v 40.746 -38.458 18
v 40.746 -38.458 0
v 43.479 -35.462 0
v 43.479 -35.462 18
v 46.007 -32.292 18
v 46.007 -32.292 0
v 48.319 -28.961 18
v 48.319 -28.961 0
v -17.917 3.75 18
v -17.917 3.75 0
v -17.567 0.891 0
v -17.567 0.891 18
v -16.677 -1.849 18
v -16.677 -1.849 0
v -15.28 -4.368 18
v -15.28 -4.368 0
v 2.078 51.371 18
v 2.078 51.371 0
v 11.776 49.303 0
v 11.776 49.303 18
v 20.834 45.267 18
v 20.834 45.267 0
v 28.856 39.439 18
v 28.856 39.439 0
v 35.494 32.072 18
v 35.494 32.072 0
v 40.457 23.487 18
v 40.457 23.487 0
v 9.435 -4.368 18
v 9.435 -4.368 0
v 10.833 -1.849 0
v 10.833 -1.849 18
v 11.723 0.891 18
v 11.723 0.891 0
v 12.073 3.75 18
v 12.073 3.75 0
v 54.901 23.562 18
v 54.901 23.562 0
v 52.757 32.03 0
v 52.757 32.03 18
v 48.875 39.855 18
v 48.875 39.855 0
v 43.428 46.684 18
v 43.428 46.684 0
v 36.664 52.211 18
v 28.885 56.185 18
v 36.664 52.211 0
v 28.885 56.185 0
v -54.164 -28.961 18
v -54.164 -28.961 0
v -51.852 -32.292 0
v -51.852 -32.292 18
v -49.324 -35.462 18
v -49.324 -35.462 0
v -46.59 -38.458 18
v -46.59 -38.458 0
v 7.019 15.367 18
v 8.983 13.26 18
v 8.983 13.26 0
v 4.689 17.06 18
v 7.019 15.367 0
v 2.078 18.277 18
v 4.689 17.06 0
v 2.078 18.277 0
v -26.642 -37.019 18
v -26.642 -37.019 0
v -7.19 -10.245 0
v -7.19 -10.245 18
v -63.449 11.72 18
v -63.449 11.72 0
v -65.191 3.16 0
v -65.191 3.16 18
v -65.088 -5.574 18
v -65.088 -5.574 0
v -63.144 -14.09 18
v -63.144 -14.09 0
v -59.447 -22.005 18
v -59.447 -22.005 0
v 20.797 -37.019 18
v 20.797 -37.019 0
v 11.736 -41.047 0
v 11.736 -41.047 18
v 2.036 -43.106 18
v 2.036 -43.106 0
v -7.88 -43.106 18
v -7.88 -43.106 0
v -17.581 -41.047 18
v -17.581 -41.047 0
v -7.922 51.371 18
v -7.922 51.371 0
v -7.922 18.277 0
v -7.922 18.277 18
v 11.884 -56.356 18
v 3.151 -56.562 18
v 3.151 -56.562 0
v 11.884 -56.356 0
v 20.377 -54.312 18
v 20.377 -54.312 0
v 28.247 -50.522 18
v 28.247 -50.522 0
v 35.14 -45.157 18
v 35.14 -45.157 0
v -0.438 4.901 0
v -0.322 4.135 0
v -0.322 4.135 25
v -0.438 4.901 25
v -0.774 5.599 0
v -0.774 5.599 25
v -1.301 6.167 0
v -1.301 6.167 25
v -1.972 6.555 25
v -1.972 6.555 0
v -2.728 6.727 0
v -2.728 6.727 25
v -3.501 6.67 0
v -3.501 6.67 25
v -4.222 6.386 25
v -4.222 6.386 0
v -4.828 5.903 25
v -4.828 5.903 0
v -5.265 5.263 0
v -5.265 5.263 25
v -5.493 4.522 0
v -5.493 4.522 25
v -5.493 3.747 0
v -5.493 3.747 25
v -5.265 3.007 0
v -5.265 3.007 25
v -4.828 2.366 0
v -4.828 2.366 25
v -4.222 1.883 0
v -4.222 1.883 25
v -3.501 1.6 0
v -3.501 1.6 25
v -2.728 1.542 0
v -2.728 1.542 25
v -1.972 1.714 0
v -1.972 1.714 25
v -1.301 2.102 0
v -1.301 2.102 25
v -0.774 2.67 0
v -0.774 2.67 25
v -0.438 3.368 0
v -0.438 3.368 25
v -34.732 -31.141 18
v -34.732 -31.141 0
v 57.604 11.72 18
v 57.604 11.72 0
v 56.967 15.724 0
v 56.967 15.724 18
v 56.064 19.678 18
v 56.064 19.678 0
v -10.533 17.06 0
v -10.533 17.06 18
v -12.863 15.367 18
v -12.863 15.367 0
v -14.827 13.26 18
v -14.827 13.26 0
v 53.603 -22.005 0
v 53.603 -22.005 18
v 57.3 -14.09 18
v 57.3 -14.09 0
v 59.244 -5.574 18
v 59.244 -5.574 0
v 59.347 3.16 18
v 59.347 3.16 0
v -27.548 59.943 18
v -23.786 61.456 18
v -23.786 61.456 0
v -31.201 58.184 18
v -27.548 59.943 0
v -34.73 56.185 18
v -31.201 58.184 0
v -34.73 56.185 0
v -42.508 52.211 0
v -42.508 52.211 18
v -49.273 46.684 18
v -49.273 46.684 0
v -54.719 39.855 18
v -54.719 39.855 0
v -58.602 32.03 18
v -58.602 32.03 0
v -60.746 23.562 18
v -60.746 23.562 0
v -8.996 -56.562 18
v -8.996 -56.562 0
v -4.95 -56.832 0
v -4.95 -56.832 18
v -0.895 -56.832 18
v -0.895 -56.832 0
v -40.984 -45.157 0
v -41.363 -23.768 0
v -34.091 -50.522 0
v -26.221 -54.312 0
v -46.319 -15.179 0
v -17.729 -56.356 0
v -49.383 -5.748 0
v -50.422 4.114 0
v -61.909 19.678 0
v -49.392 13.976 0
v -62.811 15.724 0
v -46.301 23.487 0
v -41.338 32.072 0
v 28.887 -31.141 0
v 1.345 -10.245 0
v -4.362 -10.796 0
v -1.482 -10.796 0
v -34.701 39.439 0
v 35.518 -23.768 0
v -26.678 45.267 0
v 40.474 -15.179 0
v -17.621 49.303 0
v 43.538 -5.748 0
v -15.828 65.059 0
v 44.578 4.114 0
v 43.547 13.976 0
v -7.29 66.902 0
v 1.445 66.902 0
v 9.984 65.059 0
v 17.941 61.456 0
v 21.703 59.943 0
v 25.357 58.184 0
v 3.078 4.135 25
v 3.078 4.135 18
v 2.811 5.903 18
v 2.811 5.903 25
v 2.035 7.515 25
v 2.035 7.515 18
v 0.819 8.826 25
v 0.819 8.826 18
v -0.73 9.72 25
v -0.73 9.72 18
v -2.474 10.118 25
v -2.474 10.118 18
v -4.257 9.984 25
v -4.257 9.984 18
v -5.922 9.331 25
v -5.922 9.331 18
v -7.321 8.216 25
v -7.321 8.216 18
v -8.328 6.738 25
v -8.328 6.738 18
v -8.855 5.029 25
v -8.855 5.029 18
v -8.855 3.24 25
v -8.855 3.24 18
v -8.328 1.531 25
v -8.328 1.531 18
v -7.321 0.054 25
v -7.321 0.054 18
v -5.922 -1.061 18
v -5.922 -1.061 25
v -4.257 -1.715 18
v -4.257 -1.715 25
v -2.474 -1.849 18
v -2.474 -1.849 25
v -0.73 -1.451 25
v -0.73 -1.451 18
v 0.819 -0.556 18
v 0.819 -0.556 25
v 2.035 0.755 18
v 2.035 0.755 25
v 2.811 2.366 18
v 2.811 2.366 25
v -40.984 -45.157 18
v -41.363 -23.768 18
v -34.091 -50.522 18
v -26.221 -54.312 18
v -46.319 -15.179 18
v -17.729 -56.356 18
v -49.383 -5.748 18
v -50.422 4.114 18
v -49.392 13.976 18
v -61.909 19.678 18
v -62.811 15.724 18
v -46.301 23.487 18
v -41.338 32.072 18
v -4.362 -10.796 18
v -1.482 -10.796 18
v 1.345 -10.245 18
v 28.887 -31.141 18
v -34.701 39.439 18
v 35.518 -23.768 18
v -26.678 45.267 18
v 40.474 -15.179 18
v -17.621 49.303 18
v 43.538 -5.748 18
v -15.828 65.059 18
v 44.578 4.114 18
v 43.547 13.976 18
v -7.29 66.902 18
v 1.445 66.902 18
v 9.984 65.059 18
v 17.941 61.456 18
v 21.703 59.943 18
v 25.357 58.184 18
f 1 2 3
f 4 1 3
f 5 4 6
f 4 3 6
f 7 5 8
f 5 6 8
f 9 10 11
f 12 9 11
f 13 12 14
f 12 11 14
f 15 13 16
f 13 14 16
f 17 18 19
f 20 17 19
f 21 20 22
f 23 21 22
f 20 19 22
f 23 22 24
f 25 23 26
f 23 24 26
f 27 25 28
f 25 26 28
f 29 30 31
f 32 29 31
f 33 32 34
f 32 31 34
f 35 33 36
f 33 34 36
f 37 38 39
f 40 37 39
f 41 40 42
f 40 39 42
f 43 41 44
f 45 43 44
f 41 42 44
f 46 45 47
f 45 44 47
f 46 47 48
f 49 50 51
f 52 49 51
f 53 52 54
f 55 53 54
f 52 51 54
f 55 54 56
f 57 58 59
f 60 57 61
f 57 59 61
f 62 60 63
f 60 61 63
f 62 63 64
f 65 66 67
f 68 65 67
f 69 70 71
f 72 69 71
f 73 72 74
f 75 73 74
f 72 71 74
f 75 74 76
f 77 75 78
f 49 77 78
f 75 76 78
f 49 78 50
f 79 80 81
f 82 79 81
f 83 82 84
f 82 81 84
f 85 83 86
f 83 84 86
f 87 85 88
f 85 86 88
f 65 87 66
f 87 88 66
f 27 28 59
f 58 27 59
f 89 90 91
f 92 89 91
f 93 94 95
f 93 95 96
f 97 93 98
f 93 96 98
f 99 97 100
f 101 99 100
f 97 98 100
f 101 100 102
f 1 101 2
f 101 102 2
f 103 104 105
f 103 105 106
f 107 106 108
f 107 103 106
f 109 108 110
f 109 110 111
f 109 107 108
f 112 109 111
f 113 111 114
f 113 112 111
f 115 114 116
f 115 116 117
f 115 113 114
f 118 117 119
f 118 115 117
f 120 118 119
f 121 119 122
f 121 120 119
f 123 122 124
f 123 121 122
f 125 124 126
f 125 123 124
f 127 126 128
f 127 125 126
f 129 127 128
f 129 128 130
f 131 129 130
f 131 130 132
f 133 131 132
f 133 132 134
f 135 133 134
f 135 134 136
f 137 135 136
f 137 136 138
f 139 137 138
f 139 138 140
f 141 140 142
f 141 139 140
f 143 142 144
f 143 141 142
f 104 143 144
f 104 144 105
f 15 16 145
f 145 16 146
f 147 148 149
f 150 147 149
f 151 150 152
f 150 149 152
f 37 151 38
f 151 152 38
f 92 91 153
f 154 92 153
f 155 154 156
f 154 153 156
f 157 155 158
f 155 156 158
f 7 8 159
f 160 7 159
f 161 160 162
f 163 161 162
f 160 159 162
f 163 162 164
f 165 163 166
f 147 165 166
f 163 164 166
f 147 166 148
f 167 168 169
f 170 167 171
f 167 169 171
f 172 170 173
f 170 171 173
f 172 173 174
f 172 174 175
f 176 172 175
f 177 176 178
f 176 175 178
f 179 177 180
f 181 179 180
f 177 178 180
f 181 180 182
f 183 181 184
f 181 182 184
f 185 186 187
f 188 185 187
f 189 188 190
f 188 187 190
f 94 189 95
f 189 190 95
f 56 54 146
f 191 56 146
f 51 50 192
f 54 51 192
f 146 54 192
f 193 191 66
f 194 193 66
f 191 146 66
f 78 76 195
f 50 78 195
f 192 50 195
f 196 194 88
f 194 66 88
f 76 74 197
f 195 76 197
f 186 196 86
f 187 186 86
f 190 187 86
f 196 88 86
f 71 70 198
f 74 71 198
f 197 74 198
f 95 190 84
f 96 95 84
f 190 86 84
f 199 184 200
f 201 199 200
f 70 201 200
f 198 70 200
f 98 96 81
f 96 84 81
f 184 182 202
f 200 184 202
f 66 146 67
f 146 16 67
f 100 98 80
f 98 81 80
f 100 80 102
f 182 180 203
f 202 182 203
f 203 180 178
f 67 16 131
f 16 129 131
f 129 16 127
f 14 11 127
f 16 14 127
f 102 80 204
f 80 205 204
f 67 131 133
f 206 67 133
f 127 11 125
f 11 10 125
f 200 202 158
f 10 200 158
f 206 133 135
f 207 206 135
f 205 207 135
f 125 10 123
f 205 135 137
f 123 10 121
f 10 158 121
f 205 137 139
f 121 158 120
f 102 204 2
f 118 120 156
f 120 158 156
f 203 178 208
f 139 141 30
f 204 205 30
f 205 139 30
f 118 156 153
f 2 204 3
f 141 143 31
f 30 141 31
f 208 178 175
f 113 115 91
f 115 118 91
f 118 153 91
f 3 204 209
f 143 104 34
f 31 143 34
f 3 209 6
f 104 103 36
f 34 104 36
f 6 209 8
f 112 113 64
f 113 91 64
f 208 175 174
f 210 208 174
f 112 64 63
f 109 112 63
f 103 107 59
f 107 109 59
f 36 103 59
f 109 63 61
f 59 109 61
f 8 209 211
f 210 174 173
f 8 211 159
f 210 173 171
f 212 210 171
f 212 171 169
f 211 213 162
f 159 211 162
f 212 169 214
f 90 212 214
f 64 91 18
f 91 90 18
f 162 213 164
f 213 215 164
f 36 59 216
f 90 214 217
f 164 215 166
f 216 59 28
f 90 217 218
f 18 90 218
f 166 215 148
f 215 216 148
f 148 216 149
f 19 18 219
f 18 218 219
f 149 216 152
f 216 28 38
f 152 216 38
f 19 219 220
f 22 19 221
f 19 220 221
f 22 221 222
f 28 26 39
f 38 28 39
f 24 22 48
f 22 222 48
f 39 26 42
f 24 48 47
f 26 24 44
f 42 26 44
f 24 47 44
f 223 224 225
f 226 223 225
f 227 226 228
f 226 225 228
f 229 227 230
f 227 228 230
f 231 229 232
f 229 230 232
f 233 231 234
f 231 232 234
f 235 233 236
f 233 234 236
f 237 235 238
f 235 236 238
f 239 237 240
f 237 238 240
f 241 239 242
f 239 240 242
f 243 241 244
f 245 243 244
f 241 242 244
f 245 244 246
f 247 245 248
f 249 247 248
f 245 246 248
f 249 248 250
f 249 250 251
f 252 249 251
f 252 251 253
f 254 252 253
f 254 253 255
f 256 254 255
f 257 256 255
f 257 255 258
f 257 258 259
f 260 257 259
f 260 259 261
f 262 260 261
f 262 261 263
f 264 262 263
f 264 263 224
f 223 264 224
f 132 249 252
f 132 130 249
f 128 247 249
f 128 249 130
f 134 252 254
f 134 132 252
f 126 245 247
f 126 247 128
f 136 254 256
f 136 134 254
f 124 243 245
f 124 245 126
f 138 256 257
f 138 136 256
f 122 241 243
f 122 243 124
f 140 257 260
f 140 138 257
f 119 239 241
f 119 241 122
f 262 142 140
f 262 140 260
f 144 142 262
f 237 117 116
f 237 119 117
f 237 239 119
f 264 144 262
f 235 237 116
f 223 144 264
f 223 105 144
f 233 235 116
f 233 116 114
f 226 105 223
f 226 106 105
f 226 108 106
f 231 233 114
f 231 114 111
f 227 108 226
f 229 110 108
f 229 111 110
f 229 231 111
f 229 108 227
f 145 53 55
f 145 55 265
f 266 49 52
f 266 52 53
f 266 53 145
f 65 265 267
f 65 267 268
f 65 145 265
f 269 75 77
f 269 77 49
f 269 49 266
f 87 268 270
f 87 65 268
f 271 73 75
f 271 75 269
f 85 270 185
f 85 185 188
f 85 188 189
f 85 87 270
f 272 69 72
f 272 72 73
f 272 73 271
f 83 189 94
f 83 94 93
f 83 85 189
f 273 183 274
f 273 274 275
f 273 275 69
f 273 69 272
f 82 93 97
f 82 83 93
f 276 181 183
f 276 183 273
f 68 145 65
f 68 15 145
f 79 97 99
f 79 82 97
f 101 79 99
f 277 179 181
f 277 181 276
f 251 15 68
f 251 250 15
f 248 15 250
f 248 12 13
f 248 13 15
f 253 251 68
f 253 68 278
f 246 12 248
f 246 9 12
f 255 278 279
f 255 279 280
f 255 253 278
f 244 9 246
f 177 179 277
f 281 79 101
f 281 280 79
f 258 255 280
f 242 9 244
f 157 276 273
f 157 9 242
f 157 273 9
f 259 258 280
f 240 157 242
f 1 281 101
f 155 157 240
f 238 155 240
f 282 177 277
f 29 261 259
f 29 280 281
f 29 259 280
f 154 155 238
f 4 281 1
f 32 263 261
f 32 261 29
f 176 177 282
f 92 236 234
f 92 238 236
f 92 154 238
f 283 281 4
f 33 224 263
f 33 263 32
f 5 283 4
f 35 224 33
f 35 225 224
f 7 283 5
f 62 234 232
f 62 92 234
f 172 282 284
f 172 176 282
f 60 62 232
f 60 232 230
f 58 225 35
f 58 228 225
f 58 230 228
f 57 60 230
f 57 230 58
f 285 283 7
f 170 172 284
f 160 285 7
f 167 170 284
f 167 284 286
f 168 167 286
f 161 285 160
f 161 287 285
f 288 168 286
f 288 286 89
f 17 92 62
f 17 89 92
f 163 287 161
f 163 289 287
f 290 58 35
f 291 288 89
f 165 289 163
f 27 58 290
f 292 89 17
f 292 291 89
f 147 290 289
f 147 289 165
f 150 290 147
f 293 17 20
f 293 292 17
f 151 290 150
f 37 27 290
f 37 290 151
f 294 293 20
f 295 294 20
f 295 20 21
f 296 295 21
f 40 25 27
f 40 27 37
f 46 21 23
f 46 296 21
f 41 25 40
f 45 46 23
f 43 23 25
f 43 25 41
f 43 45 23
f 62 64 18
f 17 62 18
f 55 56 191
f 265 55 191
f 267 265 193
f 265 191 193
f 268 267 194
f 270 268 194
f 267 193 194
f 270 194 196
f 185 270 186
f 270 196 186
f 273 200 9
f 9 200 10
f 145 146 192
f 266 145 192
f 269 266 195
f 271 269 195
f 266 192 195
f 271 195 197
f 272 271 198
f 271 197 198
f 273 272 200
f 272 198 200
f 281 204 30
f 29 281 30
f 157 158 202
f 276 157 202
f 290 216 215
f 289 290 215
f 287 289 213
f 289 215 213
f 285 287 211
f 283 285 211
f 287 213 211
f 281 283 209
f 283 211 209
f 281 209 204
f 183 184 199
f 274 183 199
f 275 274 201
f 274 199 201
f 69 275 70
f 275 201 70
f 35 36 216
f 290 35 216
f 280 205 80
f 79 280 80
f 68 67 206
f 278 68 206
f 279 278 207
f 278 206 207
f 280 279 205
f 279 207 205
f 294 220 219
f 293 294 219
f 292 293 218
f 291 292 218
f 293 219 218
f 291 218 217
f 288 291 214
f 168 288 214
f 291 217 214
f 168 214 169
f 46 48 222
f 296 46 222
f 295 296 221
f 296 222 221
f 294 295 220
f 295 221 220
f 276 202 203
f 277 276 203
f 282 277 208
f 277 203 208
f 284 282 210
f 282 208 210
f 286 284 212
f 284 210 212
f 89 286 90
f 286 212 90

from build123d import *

# Parameters (mm, degrees)
F0_R     = 6
F0_R_2   = 2.6
F1_DEPTH = 25
F2_DEPTH = 18


with BuildPart() as f1:
    # F0 (on Top) → F1 (new body)
    with BuildSketch(Plane.XY):
        with Locations((-2.922279, 4.134713)):
            Circle(F0_R)
        with Locations((-2.922279, 4.134713)):
            Circle(F0_R_2, mode=Mode.SUBTRACT)
    extrude(amount=F1_DEPTH)

    # F0 (on Top) → F2 (join)
    with BuildSketch(Plane.XY):
        with BuildLine():
            ThreePointArc((-34.729826, 56.185457), (-52.177662, 43.41457), (-60.745847, 23.562398))
            ThreePointArc((-60.745847, 23.562398), (-62.392882, 17.70849), (-63.448871, 11.719679))
            ThreePointArc((-63.448871, 11.719679), (-64.342738, -9.884106), (-54.16386, -28.960609))
            ThreePointArc((-54.16386, -28.960609), (-50.613999, -33.898165), (-46.590157, -38.457733))
            ThreePointArc((-46.590157, -38.457733), (-30.256955, -52.626326), (-8.995918, -56.562165))
            ThreePointArc((-8.995918, -56.562165), (-2.922279, -56.865287), (3.15136, -56.562165))
            ThreePointArc((3.15136, -56.562165), (24.412397, -52.626326), (40.745599, -38.457733))
            ThreePointArc((40.745599, -38.457733), (44.769441, -33.898165), (48.319302, -28.960609))
            ThreePointArc((48.319302, -28.960609), (58.498179, -9.884106), (57.604313, 11.719679))
            ThreePointArc((57.604313, 11.719679), (56.548324, 17.70849), (54.901289, 23.562398))
            ThreePointArc((54.901289, 23.562398), (46.333104, 43.41457), (28.885268, 56.185457))
            ThreePointArc((28.885268, 56.185457), (23.544629, 59.093814), (17.94095, 61.455963))
            ThreePointArc((17.94095, 61.455963), (-2.922279, 67.134713), (-23.785508, 61.455963))
            ThreePointArc((-23.785508, 61.455963), (-29.389187, 59.093814), (-34.729826, 56.185457))
        make_face()
        with BuildLine():
            Line((-26.641882, -37.019029), (-7.189733, -10.245442))
            ThreePointArc((-7.189733, -10.245442), (-2.922279, -10.865287), (1.345175, -10.245442))
            Line((1.345175, -10.245442), (20.797324, -37.019029))
            ThreePointArc((20.797324, -37.019029), (-2.922279, -43.365287), (-26.641882, -37.019029))
        make_face(mode=Mode.SUBTRACT)
        with BuildLine():
            Line((-49.391573, 13.976191), (-17.917334, 3.74959))
            ThreePointArc((-17.917334, 3.74959), (-17.188127, -0.500542), (-15.279903, -4.367589))
            Line((-15.279903, -4.367589), (-34.732052, -31.141176))
            ThreePointArc((-34.732052, -31.141176), (-48.097464, -10.543594), (-49.391573, 13.976191))
        make_face(mode=Mode.SUBTRACT)
        with Locations((-2.922279, 4.134713)):
            Circle(F0_R, mode=Mode.SUBTRACT)
        with BuildLine():
            Line((28.887494, -31.141176), (9.435345, -4.367589))
            ThreePointArc((9.435345, -4.367589), (11.343569, -0.500542), (12.072776, 3.74959))
            Line((12.072776, 3.74959), (43.547015, 13.976191))
            ThreePointArc((43.547015, 13.976191), (42.252905, -10.543594), (28.887494, -31.141176))
        make_face(mode=Mode.SUBTRACT)
        with BuildLine():
            ThreePointArc((-46.301403, 23.486756), (-30.842079, 42.56302), (-7.922279, 51.370822))
            Line((-7.922279, 51.370822), (-7.922279, 18.276848))
            ThreePointArc((-7.922279, 18.276848), (-11.739058, 16.269968), (-14.827164, 13.260156))
            Line((-14.827164, 13.260156), (-46.301403, 23.486756))
        make_face(mode=Mode.SUBTRACT)
        with BuildLine():
            ThreePointArc((8.982606, 13.260156), (5.8945, 16.269968), (2.077721, 18.276848))
            Line((2.077721, 18.276848), (2.077721, 51.370822))
            ThreePointArc((2.077721, 51.370822), (24.99752, 42.56302), (40.456845, 23.486756))
            Line((40.456845, 23.486756), (8.982606, 13.260156))
        make_face(mode=Mode.SUBTRACT)
    extrude(amount=F2_DEPTH)


solid = f1.part
